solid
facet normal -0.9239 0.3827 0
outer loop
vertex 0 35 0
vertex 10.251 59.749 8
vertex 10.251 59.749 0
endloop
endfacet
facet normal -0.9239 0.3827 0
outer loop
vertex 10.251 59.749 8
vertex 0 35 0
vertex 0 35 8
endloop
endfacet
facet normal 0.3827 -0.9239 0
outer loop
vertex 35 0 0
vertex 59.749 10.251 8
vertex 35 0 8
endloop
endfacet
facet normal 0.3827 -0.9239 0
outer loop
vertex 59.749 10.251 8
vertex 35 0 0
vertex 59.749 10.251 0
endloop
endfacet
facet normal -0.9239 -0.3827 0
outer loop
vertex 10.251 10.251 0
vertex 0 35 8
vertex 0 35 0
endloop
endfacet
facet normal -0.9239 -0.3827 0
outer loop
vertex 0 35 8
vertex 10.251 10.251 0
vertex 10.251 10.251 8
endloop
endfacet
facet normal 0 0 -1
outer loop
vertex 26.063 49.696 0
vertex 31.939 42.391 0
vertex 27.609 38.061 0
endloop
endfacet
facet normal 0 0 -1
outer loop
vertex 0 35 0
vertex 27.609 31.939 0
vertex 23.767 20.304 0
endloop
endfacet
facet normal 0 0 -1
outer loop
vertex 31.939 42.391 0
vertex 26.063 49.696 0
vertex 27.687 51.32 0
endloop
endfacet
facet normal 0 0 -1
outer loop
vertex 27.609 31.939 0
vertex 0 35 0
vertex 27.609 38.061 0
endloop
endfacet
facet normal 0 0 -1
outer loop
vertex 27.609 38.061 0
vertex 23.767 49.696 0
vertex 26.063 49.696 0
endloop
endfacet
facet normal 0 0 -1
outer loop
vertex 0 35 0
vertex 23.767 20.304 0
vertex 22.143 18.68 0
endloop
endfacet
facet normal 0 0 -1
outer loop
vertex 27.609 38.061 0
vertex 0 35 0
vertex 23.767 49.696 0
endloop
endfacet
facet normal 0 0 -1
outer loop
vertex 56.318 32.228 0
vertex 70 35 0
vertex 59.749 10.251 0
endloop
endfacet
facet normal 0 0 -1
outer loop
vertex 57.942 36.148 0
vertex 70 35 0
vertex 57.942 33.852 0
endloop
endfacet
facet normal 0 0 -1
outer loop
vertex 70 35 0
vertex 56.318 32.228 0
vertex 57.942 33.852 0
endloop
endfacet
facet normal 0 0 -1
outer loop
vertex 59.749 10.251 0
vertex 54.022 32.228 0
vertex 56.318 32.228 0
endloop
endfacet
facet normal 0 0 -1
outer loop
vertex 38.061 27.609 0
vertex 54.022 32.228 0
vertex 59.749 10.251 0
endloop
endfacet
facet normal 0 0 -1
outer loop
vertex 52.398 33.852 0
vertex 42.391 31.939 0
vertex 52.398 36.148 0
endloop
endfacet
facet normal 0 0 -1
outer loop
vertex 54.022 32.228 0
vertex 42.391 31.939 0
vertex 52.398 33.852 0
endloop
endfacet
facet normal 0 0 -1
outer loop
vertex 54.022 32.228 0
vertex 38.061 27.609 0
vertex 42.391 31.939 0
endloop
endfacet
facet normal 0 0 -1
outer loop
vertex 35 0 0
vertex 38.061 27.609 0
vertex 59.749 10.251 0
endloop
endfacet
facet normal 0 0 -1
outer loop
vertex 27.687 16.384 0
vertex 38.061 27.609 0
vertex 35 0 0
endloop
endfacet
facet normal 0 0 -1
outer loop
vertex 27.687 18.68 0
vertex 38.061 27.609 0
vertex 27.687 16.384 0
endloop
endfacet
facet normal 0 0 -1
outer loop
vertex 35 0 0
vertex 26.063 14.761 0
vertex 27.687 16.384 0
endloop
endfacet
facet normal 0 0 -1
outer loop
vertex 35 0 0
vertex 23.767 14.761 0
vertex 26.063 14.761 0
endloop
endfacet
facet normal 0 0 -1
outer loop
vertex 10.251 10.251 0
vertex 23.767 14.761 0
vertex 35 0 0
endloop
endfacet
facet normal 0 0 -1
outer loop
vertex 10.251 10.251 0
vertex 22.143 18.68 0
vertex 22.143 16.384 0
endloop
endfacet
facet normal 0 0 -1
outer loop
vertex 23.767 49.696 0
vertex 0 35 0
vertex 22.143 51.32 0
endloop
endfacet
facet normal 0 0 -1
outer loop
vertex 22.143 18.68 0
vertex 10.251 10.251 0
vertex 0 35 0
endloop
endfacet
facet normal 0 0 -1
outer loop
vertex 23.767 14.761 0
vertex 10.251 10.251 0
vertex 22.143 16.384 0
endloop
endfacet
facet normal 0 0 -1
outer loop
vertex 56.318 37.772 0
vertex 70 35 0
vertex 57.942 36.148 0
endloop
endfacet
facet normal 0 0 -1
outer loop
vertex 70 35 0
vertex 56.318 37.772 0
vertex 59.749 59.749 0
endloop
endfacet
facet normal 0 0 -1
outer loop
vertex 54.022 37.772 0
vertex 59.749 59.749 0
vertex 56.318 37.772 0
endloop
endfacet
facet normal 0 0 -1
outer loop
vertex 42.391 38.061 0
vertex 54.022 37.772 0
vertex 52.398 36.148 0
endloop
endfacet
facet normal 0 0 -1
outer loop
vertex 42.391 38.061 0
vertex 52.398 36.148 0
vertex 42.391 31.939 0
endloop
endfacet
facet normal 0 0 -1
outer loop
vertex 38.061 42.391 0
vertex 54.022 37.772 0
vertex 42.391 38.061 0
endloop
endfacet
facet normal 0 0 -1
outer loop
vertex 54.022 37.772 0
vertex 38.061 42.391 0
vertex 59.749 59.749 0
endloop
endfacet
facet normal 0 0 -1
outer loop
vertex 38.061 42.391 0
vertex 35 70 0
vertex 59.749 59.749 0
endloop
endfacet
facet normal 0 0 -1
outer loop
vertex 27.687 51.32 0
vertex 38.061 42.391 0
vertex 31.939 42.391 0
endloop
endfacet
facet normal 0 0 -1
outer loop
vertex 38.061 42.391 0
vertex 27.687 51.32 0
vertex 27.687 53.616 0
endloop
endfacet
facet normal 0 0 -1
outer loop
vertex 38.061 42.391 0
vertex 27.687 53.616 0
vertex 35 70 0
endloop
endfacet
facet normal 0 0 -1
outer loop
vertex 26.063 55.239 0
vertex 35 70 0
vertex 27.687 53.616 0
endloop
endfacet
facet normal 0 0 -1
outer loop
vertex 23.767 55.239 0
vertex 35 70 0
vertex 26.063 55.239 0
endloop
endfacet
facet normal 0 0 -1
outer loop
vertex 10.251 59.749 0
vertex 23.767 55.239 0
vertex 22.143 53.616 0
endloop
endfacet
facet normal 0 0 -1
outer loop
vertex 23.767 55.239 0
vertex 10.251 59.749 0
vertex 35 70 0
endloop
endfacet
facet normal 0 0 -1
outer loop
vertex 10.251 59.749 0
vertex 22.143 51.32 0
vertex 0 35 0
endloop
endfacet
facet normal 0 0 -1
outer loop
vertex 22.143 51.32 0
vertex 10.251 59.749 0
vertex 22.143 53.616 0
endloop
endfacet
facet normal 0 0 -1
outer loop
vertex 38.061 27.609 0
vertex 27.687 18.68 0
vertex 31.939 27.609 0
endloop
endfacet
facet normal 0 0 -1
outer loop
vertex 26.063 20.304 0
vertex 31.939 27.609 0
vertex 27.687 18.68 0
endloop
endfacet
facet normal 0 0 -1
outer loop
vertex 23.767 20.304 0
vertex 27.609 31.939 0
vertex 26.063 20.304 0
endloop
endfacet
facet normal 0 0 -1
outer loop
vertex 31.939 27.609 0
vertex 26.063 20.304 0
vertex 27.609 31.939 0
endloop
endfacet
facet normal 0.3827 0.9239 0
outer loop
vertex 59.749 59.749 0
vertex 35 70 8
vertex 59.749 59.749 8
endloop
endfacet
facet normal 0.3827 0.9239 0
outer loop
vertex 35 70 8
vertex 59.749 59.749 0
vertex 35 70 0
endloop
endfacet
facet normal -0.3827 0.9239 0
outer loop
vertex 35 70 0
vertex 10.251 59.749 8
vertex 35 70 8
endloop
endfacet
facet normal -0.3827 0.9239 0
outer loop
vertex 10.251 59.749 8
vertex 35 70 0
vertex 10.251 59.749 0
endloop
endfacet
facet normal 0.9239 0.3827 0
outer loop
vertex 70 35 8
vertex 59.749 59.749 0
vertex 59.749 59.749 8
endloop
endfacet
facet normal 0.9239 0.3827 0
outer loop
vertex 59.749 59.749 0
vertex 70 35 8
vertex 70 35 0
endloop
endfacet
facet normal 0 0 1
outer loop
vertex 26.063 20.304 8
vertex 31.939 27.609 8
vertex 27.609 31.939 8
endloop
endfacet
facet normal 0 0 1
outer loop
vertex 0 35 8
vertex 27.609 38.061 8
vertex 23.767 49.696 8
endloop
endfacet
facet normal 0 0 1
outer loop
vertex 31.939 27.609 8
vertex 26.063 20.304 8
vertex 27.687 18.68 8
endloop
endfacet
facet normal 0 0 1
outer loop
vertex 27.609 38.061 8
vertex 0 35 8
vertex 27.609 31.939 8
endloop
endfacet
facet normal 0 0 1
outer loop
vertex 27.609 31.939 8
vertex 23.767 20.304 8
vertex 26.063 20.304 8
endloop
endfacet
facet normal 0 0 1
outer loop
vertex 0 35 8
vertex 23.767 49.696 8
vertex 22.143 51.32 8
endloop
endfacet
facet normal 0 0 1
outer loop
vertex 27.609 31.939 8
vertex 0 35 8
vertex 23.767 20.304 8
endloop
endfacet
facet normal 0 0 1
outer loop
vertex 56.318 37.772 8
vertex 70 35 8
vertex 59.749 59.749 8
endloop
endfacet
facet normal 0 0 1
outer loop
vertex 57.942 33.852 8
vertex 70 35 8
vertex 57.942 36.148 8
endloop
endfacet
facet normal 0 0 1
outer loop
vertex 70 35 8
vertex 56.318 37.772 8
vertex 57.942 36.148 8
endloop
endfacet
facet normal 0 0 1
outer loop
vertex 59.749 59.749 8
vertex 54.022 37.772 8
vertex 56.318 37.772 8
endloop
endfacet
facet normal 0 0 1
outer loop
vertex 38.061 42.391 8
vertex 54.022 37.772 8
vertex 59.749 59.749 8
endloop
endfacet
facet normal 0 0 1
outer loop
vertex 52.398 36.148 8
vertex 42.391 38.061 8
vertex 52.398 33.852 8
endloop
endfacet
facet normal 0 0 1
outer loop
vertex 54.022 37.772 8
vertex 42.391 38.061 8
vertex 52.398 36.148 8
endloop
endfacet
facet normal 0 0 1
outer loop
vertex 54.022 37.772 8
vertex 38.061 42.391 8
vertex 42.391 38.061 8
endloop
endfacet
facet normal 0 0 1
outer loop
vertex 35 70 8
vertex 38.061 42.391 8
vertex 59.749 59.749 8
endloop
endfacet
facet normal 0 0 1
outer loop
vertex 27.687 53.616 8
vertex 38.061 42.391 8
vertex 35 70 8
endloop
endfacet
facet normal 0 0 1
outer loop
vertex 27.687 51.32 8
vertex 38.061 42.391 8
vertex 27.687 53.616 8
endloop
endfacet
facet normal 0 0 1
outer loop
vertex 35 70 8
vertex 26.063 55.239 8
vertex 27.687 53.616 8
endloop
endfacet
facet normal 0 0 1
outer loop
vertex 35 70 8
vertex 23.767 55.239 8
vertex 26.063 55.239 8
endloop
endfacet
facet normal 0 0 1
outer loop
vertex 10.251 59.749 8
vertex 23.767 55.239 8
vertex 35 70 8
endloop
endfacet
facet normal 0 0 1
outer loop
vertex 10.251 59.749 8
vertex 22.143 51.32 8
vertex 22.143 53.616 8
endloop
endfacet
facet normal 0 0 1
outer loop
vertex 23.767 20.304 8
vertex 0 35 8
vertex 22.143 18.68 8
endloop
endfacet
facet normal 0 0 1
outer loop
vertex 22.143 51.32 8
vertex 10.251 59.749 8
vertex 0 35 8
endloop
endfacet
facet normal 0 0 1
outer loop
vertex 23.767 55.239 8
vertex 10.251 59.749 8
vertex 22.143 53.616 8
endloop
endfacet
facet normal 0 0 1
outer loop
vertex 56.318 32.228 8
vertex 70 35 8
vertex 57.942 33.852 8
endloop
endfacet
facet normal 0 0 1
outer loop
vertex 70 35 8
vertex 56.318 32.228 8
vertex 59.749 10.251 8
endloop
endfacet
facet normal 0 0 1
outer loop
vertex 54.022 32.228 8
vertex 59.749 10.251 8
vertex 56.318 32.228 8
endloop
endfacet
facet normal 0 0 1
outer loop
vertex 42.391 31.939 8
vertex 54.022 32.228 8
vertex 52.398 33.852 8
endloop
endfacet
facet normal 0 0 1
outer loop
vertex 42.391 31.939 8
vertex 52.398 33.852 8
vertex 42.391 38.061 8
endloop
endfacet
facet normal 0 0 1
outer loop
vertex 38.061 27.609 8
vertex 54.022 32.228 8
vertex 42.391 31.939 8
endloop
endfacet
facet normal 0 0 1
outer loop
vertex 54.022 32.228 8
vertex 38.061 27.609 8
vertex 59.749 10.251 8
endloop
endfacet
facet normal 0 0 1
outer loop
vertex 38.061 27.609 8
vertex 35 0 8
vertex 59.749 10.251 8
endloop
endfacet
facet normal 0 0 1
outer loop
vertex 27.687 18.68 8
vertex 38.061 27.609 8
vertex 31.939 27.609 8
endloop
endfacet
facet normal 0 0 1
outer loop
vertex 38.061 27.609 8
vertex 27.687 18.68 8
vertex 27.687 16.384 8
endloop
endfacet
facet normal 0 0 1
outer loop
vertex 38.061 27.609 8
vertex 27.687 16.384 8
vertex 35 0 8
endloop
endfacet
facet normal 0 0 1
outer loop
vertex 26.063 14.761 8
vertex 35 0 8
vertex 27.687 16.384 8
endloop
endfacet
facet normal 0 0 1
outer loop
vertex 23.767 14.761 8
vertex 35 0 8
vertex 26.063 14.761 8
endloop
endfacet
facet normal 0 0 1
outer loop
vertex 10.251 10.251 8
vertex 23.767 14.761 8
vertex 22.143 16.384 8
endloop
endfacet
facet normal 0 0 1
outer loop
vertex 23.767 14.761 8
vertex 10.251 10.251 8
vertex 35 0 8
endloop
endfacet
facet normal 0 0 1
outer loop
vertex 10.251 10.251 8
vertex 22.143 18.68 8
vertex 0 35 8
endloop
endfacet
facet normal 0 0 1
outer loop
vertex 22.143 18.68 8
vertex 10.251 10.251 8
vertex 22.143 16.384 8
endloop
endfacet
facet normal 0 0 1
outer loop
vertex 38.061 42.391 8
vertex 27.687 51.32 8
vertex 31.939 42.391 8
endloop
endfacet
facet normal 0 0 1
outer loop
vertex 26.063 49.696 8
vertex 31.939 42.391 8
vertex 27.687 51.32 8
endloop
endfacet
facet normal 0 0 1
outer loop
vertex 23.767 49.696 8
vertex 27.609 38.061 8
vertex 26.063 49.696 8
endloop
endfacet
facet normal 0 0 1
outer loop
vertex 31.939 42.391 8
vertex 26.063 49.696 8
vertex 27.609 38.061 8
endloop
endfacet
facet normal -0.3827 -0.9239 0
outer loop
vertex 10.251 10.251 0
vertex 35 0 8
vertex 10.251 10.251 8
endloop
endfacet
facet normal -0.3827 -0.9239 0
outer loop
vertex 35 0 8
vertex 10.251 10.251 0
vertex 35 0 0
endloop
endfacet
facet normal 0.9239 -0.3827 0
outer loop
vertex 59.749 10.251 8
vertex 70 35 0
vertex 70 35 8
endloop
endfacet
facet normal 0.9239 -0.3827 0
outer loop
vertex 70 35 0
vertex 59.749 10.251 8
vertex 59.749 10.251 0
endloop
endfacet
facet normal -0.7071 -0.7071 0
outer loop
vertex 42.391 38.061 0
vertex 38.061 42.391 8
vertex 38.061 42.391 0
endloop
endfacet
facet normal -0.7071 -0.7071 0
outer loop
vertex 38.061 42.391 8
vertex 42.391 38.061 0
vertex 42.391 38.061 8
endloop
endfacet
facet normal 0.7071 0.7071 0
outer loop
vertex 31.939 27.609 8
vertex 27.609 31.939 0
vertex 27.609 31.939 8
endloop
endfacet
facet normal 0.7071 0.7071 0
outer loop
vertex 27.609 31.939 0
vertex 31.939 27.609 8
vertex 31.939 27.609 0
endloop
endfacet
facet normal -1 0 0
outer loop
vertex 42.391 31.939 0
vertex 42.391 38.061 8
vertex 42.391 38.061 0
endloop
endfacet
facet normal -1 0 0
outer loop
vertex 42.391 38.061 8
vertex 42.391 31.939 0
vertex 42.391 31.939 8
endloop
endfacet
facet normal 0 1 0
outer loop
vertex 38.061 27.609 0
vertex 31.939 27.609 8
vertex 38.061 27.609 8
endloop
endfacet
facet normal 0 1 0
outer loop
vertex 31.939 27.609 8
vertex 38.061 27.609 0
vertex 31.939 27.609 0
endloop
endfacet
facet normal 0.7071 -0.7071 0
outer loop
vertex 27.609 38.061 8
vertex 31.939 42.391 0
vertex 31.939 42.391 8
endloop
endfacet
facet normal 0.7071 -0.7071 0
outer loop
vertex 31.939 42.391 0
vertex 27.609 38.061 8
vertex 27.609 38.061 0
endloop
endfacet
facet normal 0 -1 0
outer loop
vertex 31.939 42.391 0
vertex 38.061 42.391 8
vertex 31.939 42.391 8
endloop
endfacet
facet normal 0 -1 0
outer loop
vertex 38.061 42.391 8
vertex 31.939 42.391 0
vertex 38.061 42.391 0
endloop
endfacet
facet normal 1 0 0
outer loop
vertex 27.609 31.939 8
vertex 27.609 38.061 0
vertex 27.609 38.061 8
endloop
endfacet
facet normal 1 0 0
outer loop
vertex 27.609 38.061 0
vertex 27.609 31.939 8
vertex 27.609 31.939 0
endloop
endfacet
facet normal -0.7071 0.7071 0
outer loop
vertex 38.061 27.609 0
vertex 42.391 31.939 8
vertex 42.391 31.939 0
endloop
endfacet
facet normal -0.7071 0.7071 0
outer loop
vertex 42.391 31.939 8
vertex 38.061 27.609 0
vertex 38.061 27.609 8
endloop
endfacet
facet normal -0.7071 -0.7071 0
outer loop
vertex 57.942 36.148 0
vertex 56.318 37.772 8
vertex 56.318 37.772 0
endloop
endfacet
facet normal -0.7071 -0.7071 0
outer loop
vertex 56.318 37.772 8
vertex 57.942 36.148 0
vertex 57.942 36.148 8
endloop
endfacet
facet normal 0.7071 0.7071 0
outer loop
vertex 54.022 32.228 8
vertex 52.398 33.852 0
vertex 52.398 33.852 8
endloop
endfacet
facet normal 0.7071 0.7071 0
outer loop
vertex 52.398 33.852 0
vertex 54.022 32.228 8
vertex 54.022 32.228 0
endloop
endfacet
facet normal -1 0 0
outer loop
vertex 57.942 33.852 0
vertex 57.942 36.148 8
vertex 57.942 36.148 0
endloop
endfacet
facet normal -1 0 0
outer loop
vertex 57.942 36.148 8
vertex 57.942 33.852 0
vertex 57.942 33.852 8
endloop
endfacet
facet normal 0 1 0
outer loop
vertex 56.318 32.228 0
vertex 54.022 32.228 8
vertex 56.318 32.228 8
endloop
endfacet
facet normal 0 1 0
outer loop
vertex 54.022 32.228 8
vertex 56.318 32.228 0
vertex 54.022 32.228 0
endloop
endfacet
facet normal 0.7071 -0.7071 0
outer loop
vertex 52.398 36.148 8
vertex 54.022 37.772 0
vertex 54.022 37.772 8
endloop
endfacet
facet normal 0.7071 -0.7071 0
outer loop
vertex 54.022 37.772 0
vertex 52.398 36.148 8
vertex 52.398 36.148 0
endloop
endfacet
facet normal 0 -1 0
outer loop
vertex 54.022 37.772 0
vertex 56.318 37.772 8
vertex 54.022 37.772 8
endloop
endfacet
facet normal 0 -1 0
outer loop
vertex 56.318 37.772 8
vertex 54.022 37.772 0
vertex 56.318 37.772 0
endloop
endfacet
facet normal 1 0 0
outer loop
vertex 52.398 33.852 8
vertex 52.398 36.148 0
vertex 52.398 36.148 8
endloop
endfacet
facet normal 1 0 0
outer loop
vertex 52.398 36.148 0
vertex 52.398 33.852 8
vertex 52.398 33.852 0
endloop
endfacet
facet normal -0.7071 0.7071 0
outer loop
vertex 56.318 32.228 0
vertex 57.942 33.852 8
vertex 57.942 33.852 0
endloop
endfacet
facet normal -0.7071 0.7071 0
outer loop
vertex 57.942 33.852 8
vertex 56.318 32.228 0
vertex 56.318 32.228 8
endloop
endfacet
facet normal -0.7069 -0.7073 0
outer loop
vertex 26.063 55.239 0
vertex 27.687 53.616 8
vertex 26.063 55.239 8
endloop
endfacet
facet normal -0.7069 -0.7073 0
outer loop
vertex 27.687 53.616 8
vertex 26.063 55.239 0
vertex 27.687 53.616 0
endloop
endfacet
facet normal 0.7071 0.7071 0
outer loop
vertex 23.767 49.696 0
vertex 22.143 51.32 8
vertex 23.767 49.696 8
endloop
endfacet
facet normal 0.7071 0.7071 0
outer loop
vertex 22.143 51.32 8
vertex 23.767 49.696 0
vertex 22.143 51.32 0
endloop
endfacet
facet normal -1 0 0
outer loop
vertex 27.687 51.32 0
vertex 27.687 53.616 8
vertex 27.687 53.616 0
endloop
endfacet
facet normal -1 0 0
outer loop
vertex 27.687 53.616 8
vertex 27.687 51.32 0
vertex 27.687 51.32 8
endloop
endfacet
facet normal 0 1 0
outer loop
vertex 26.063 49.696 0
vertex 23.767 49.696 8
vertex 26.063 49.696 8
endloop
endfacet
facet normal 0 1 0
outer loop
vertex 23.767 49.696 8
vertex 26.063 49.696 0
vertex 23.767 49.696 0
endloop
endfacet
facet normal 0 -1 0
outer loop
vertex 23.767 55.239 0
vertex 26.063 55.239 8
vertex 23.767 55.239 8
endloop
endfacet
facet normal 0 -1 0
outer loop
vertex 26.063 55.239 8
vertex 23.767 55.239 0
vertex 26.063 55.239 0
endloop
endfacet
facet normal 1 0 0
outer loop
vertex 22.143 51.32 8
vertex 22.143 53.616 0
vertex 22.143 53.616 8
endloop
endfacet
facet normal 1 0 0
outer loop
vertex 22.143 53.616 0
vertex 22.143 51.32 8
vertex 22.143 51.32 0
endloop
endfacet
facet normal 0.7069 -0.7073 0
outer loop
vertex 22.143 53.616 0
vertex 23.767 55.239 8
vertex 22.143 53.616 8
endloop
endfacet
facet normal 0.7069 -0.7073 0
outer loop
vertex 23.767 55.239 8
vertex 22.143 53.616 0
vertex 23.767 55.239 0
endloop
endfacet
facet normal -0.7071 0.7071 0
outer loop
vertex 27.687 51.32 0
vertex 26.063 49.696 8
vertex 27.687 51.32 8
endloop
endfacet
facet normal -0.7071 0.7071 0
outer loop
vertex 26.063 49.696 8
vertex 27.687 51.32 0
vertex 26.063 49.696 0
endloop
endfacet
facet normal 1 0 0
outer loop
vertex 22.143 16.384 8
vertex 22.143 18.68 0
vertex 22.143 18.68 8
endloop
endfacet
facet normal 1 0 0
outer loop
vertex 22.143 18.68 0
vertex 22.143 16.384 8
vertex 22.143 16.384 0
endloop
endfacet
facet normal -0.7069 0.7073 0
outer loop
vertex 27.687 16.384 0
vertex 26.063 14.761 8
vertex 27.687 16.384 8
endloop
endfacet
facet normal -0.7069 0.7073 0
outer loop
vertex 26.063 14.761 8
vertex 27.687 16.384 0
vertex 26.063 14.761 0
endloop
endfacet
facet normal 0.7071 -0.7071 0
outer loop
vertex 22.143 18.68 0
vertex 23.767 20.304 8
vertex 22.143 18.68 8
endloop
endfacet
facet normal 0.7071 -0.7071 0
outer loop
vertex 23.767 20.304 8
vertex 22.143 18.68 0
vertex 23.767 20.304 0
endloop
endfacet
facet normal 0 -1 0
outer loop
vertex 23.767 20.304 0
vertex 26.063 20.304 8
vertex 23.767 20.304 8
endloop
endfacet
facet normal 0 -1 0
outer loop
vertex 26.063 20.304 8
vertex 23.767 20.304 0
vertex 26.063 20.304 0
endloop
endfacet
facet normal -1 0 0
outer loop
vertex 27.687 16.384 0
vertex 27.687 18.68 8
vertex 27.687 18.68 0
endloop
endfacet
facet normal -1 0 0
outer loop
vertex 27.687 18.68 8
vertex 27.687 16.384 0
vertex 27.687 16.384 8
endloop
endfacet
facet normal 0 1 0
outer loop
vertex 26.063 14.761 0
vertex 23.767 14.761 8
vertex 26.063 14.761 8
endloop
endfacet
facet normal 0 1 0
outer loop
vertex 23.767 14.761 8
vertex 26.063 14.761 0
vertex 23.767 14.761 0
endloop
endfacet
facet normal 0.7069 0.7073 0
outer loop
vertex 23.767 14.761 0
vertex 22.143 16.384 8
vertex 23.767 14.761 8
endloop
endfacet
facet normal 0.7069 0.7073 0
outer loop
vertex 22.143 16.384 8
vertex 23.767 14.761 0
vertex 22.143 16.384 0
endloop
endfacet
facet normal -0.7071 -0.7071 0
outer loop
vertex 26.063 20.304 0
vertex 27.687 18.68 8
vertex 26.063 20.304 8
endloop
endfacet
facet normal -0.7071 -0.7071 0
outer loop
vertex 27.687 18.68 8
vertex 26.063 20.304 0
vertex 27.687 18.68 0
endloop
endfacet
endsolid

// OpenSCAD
$fn = 32;

// ----------------------------------------------------------------------
// Polygon plate: 8-gon R35, 3 bolt windows
// ----------------------------------------------------------------------

// --- parameters (mm) ---
sides = 8;                // number of polygon sides
plate_r = 35;             // circumscribed radius of the polygon
bore_r = 8;               // centre bore radius
bolts = 3;                // number of bolt windows
ring_r = 20.17;           // bolt-circle radius
bolt_r = 3;               // bolt window radius
plate_t = 8;              // plate thickness, Z (extrusion height)

plate_d = 2 * plate_r;  // circumscribed diameter
bore_d = 2 * bore_r;  // centre bore diameter
bolt_d = 2 * bolt_r;  // bolt window diameter
ring_d = 2 * ring_r;  // bolt-circle diameter

profile = [[70, 35], [59.749, 59.749], [35, 70], [10.251, 59.749], [0, 35], [10.251, 10.251], [35, 0], [59.749, 10.251]];  // primary outline, 8 points, counter clockwise
void_1 = [[42.391, 38.061], [38.061, 42.391], [31.939, 42.391], [27.609, 38.061], [27.609, 31.939], [31.939, 27.609], [38.061, 27.609], [42.391, 31.939]];  // centre bore, 8 points
void_2 = [[57.942, 36.148], [56.318, 37.772], [54.022, 37.772], [52.398, 36.148], [52.398, 33.852], [54.022, 32.228], [56.318, 32.228], [57.942, 33.852]];  // bolt window 1, 8 points
void_3 = [[27.687, 53.616], [26.063, 55.239], [23.767, 55.239], [22.143, 53.616], [22.143, 51.32], [23.767, 49.696], [26.063, 49.696], [27.687, 51.32]];  // bolt window 2, 8 points
void_4 = [[27.687, 18.68], [26.063, 20.304], [23.767, 20.304], [22.143, 18.68], [22.143, 16.384], [23.767, 14.761], [26.063, 14.761], [27.687, 16.384]];  // bolt window 3, 8 points

// --- the one profile operation ---
difference() {
  linear_extrude(height = plate_t) polygon(points = profile);
  translate([0, 0, -1])
    linear_extrude(height = plate_t + 2) polygon(points = void_1);
  translate([0, 0, -1])
    linear_extrude(height = plate_t + 2) polygon(points = void_2);
  translate([0, 0, -1])
    linear_extrude(height = plate_t + 2) polygon(points = void_3);
  translate([0, 0, -1])
    linear_extrude(height = plate_t + 2) polygon(points = void_4);
}
